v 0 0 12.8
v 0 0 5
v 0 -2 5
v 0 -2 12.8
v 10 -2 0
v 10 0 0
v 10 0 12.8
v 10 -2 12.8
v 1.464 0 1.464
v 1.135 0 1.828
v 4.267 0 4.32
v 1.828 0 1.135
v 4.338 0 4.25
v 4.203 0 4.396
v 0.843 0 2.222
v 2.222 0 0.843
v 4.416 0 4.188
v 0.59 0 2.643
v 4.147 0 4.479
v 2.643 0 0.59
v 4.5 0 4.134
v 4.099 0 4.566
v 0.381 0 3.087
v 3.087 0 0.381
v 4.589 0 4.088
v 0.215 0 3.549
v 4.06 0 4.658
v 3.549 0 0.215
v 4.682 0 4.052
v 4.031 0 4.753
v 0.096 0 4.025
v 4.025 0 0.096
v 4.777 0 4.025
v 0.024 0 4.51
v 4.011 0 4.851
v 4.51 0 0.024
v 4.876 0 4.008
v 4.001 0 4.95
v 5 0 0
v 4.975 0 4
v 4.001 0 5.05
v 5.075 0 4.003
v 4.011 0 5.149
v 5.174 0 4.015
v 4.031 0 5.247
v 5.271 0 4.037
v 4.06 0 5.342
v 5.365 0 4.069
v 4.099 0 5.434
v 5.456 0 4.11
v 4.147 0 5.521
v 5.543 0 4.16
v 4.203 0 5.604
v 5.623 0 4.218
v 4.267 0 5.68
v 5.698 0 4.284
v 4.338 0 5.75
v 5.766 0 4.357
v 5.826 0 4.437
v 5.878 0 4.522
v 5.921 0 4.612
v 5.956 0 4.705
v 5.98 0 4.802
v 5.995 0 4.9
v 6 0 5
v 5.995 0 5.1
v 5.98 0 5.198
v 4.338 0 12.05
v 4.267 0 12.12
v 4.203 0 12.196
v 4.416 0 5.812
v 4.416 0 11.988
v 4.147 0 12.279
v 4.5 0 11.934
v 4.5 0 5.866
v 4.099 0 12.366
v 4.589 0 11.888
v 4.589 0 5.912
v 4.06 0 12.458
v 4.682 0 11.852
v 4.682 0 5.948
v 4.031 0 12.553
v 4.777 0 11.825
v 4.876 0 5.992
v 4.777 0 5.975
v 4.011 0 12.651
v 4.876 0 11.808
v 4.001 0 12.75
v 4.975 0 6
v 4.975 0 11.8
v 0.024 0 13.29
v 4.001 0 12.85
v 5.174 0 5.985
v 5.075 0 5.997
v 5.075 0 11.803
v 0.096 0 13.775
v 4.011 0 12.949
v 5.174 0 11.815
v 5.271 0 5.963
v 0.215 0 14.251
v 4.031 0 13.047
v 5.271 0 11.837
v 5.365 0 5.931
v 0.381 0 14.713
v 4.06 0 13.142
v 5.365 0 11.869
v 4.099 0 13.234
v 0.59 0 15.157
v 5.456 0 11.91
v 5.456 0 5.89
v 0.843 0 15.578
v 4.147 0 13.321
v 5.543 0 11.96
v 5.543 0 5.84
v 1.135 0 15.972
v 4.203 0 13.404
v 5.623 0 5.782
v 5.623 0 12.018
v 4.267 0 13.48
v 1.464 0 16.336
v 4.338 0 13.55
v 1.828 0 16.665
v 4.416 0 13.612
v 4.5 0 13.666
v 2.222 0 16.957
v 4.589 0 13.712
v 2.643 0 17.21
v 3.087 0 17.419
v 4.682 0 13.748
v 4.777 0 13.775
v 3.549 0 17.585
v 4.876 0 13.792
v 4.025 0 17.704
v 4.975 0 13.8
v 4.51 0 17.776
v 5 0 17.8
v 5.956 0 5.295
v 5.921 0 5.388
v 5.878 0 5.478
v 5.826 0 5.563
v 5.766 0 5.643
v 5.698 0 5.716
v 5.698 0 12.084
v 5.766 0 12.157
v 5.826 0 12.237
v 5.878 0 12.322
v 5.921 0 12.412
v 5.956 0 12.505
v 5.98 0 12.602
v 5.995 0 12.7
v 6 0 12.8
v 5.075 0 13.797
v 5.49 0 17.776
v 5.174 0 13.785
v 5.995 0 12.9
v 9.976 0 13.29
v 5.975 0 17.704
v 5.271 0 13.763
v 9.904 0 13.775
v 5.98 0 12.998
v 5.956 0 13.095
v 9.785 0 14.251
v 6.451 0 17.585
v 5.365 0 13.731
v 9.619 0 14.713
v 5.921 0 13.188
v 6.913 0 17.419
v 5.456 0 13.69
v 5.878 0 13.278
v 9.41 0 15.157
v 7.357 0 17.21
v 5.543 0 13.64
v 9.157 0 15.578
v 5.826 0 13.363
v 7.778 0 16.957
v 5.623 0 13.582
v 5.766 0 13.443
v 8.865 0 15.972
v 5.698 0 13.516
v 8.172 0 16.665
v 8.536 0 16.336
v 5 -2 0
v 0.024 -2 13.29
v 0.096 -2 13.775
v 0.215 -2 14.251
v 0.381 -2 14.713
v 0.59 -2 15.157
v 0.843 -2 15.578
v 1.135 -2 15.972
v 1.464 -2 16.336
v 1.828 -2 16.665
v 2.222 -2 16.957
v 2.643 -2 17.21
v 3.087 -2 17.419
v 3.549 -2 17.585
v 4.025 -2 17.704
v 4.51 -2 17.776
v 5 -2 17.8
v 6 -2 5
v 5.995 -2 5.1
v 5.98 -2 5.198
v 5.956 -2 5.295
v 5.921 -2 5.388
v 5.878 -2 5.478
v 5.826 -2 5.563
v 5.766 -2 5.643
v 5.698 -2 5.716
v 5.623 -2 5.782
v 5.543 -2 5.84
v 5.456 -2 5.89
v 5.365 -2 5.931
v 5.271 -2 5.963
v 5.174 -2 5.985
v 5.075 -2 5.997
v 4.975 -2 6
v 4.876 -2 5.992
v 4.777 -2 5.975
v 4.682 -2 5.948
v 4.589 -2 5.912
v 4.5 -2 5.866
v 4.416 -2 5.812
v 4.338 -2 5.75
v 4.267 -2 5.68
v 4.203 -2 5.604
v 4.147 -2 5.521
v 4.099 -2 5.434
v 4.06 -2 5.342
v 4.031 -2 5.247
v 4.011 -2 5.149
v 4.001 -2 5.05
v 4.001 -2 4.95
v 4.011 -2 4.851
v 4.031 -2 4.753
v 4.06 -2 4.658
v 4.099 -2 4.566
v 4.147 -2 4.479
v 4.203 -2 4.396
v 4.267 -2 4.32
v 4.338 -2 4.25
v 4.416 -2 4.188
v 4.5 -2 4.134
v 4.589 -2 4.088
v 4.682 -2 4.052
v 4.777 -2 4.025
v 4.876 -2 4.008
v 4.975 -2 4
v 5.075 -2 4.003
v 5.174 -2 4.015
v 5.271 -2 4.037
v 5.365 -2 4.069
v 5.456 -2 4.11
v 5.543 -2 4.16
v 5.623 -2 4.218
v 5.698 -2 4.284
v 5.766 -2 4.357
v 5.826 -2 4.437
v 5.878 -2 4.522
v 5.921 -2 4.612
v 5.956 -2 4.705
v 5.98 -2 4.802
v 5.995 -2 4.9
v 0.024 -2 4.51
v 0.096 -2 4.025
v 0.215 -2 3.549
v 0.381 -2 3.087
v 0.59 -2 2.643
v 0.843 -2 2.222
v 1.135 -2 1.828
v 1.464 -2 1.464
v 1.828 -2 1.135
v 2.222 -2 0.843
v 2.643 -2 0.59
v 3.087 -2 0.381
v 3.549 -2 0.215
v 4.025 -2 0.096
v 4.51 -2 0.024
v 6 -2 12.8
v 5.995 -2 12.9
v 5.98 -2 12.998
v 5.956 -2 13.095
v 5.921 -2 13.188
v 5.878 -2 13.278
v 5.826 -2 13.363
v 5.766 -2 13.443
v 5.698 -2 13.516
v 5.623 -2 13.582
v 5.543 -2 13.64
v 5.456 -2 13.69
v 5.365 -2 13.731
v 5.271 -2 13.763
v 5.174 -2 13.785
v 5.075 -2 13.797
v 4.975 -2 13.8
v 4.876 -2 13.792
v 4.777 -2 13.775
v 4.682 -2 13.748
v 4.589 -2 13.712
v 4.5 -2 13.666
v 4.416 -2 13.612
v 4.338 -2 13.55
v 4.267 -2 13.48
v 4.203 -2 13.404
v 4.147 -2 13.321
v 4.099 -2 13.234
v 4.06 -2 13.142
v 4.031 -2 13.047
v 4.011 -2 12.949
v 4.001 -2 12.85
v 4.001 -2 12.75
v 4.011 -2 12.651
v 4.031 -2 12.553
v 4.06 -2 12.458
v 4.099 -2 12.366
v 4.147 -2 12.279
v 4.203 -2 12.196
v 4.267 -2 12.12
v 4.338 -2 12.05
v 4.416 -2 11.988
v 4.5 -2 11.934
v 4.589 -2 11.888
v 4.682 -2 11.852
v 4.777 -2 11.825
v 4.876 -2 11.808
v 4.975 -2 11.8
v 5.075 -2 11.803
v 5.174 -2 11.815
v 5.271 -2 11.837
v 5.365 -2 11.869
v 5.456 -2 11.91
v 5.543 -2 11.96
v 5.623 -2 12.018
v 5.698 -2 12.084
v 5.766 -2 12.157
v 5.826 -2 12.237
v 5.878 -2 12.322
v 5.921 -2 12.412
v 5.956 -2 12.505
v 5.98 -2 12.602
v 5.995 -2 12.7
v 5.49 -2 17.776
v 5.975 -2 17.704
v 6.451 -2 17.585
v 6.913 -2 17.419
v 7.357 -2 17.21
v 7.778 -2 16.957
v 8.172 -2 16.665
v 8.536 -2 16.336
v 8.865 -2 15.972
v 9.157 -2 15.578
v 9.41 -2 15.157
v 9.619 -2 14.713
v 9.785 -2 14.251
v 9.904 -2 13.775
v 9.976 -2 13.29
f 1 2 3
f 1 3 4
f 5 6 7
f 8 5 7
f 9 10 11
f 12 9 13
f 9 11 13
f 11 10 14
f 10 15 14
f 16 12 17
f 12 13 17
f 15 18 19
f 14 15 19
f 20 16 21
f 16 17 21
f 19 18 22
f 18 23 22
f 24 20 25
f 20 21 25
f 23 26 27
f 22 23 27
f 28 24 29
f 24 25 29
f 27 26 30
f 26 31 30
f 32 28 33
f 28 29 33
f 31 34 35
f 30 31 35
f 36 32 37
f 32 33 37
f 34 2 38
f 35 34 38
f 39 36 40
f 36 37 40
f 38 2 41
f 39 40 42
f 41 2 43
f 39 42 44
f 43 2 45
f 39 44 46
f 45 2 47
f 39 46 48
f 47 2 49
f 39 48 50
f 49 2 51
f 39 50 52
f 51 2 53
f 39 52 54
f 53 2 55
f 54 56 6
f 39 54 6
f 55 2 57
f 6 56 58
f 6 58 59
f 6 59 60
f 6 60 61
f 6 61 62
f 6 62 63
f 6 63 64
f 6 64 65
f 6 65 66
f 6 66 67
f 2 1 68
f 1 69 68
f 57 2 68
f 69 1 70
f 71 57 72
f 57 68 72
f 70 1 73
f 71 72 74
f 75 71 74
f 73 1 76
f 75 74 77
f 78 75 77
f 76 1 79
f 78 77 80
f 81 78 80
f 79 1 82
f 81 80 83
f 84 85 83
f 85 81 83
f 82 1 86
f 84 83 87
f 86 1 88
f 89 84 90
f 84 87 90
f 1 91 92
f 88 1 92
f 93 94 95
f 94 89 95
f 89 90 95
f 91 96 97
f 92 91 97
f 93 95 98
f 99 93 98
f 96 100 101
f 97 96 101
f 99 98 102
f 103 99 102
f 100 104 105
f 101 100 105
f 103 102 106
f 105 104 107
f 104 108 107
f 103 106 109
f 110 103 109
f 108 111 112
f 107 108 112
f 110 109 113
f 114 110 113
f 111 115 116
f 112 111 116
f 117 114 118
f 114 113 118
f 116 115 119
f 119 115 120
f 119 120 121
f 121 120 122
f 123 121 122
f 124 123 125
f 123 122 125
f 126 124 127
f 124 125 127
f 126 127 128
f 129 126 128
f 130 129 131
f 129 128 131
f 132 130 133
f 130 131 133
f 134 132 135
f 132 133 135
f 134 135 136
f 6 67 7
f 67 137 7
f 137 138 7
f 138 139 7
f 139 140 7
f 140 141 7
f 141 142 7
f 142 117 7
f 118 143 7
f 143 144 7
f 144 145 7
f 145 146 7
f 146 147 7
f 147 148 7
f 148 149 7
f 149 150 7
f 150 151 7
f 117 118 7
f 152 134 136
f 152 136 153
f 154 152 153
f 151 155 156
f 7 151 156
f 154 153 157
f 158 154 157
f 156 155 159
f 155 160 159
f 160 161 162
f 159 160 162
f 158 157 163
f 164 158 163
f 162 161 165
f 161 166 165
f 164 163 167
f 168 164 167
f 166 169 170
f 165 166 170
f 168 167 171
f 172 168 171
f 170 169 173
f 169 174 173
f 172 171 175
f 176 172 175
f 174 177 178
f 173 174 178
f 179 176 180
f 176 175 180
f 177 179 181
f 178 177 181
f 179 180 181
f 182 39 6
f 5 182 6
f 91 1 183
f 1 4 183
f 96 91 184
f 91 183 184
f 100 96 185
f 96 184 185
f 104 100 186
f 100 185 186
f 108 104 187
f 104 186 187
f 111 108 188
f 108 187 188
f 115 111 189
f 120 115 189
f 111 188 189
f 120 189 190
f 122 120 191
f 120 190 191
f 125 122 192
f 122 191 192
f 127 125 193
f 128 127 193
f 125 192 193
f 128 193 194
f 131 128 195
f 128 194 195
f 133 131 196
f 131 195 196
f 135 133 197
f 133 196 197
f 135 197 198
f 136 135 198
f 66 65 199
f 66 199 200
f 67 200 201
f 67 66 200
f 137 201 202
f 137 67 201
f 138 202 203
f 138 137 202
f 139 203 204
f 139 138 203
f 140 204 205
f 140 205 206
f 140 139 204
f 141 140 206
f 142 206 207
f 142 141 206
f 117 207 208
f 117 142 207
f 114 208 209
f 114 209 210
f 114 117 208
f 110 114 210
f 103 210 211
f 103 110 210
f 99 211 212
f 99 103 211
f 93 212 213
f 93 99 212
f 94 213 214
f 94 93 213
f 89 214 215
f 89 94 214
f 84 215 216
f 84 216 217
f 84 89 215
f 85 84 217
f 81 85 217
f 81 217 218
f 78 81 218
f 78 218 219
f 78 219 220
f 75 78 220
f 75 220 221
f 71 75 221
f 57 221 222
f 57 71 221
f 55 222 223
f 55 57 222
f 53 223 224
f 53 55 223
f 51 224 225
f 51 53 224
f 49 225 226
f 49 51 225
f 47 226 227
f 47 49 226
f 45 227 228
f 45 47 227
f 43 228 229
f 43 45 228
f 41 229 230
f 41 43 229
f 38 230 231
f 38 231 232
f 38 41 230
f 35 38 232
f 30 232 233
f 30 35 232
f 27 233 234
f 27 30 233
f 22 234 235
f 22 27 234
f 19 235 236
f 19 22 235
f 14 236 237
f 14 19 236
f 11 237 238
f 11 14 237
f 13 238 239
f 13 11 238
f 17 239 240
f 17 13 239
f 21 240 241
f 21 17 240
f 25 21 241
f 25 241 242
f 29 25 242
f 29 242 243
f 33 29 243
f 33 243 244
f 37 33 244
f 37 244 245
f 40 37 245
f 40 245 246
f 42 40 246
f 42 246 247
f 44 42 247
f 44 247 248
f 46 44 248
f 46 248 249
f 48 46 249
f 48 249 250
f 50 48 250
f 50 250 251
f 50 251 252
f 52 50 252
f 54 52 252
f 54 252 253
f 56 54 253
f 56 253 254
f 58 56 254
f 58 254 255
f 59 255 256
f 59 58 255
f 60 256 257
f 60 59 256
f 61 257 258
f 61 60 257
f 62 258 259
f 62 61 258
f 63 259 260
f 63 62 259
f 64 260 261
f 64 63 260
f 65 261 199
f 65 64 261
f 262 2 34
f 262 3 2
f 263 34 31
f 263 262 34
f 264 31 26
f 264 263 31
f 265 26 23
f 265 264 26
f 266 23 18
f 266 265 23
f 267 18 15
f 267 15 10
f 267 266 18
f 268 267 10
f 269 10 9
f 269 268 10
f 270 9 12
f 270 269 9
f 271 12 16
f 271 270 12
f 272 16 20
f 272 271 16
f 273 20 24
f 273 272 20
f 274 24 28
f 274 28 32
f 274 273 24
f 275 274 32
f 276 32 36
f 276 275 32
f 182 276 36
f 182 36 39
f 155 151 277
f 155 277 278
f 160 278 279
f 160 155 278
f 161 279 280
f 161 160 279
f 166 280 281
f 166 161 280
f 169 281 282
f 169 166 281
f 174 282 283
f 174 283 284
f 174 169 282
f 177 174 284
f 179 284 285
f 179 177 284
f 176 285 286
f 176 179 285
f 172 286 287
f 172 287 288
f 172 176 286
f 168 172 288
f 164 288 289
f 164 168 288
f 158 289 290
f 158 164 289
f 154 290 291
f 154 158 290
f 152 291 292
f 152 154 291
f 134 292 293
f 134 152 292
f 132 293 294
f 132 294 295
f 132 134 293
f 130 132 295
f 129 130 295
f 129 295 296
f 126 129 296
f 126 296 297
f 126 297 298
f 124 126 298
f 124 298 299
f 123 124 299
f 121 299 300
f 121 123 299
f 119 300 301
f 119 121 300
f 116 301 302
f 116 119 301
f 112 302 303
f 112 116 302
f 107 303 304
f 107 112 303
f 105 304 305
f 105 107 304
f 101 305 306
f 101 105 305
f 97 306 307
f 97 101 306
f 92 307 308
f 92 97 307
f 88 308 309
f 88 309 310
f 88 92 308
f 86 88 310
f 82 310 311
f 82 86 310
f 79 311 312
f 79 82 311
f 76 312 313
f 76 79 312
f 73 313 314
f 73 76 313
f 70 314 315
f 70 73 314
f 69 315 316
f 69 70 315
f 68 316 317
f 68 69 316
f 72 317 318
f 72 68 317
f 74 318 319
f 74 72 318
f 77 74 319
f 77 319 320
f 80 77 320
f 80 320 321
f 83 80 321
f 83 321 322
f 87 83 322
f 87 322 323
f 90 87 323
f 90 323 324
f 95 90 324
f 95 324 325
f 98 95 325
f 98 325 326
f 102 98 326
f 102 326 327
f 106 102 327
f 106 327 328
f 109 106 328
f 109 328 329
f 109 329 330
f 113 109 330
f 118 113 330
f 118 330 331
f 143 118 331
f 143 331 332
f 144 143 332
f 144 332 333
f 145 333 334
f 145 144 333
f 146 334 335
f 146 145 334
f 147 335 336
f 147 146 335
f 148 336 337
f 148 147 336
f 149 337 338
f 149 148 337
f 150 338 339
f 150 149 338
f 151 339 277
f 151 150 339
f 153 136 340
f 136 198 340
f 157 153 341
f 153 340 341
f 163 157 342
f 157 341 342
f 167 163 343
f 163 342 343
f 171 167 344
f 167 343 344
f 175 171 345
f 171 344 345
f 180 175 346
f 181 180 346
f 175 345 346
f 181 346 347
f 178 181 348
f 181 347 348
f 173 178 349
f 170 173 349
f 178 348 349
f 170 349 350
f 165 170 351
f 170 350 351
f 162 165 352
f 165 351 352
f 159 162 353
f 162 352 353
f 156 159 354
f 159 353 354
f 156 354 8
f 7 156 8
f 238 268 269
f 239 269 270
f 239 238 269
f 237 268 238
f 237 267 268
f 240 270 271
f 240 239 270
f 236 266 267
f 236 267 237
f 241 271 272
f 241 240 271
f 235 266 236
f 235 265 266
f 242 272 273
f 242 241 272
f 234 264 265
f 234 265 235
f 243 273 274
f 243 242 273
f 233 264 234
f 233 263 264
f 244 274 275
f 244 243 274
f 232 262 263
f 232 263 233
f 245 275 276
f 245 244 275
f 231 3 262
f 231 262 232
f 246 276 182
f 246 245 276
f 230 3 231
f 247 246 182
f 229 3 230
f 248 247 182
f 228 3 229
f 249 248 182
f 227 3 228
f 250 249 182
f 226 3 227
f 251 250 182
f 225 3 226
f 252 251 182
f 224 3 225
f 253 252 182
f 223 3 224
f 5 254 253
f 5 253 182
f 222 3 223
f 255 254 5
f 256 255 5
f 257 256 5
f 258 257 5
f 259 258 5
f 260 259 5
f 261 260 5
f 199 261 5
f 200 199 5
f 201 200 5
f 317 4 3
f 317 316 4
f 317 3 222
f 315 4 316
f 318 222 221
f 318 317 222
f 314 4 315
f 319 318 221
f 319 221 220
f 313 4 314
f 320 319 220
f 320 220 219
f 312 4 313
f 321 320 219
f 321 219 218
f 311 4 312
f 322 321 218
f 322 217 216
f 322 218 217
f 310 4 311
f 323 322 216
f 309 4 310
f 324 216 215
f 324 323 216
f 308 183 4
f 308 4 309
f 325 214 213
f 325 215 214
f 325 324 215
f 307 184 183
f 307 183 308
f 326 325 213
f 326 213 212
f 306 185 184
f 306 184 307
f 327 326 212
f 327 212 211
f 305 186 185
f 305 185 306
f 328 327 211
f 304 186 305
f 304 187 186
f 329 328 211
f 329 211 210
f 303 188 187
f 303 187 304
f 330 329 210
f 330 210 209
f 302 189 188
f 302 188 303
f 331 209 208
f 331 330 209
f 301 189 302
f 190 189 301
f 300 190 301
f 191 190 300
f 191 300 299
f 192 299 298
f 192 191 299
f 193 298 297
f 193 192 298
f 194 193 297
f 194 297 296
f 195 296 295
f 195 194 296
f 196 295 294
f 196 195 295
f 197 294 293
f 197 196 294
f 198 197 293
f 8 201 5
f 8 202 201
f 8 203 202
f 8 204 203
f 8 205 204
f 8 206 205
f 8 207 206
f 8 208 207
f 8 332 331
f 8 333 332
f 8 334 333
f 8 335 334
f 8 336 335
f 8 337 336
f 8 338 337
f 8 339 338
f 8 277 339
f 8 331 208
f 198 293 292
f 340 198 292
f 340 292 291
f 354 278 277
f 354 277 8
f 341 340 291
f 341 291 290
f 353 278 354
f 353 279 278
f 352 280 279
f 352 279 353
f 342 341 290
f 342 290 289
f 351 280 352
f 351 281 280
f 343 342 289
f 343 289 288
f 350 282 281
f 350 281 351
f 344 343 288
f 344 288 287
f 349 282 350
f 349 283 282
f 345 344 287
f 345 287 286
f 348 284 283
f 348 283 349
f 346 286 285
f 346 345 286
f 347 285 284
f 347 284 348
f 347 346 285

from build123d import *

# Parameters (mm, degrees)
F0_W     = 10
F0_H     = 17.8
F0_R     = 1
F1_DEPTH = 2
F2_R     = 4.99999


# Not quite as in the source:
# - a fillet or chamfer is up to 0.001 mm smaller than in the source, because OpenCascade refuses the exact size


with BuildPart() as f1:
    # F0 (on Front) → F1 (new body)
    with BuildSketch(Plane.XZ):
        with Locations((5, 8.9)):
            Rectangle(F0_W, F0_H)
        with Locations((5, 5)):
            Circle(F0_R, mode=Mode.SUBTRACT)
        with Locations((5, 12.8)):
            Circle(F0_R, mode=Mode.SUBTRACT)
    extrude(amount=F1_DEPTH)

    # F2 (radius 5 in the source; OpenCascade refuses exactly that, so slightly less here)
    f2_edges = [f1.edges().sort_by_distance(p)[0] for p in [
        (0, -1, 17.8),
        (10, -1, 17.8),
        (0, -1, 0),
    ]]
    fillet(f2_edges, radius=F2_R)


solid = f1.part
